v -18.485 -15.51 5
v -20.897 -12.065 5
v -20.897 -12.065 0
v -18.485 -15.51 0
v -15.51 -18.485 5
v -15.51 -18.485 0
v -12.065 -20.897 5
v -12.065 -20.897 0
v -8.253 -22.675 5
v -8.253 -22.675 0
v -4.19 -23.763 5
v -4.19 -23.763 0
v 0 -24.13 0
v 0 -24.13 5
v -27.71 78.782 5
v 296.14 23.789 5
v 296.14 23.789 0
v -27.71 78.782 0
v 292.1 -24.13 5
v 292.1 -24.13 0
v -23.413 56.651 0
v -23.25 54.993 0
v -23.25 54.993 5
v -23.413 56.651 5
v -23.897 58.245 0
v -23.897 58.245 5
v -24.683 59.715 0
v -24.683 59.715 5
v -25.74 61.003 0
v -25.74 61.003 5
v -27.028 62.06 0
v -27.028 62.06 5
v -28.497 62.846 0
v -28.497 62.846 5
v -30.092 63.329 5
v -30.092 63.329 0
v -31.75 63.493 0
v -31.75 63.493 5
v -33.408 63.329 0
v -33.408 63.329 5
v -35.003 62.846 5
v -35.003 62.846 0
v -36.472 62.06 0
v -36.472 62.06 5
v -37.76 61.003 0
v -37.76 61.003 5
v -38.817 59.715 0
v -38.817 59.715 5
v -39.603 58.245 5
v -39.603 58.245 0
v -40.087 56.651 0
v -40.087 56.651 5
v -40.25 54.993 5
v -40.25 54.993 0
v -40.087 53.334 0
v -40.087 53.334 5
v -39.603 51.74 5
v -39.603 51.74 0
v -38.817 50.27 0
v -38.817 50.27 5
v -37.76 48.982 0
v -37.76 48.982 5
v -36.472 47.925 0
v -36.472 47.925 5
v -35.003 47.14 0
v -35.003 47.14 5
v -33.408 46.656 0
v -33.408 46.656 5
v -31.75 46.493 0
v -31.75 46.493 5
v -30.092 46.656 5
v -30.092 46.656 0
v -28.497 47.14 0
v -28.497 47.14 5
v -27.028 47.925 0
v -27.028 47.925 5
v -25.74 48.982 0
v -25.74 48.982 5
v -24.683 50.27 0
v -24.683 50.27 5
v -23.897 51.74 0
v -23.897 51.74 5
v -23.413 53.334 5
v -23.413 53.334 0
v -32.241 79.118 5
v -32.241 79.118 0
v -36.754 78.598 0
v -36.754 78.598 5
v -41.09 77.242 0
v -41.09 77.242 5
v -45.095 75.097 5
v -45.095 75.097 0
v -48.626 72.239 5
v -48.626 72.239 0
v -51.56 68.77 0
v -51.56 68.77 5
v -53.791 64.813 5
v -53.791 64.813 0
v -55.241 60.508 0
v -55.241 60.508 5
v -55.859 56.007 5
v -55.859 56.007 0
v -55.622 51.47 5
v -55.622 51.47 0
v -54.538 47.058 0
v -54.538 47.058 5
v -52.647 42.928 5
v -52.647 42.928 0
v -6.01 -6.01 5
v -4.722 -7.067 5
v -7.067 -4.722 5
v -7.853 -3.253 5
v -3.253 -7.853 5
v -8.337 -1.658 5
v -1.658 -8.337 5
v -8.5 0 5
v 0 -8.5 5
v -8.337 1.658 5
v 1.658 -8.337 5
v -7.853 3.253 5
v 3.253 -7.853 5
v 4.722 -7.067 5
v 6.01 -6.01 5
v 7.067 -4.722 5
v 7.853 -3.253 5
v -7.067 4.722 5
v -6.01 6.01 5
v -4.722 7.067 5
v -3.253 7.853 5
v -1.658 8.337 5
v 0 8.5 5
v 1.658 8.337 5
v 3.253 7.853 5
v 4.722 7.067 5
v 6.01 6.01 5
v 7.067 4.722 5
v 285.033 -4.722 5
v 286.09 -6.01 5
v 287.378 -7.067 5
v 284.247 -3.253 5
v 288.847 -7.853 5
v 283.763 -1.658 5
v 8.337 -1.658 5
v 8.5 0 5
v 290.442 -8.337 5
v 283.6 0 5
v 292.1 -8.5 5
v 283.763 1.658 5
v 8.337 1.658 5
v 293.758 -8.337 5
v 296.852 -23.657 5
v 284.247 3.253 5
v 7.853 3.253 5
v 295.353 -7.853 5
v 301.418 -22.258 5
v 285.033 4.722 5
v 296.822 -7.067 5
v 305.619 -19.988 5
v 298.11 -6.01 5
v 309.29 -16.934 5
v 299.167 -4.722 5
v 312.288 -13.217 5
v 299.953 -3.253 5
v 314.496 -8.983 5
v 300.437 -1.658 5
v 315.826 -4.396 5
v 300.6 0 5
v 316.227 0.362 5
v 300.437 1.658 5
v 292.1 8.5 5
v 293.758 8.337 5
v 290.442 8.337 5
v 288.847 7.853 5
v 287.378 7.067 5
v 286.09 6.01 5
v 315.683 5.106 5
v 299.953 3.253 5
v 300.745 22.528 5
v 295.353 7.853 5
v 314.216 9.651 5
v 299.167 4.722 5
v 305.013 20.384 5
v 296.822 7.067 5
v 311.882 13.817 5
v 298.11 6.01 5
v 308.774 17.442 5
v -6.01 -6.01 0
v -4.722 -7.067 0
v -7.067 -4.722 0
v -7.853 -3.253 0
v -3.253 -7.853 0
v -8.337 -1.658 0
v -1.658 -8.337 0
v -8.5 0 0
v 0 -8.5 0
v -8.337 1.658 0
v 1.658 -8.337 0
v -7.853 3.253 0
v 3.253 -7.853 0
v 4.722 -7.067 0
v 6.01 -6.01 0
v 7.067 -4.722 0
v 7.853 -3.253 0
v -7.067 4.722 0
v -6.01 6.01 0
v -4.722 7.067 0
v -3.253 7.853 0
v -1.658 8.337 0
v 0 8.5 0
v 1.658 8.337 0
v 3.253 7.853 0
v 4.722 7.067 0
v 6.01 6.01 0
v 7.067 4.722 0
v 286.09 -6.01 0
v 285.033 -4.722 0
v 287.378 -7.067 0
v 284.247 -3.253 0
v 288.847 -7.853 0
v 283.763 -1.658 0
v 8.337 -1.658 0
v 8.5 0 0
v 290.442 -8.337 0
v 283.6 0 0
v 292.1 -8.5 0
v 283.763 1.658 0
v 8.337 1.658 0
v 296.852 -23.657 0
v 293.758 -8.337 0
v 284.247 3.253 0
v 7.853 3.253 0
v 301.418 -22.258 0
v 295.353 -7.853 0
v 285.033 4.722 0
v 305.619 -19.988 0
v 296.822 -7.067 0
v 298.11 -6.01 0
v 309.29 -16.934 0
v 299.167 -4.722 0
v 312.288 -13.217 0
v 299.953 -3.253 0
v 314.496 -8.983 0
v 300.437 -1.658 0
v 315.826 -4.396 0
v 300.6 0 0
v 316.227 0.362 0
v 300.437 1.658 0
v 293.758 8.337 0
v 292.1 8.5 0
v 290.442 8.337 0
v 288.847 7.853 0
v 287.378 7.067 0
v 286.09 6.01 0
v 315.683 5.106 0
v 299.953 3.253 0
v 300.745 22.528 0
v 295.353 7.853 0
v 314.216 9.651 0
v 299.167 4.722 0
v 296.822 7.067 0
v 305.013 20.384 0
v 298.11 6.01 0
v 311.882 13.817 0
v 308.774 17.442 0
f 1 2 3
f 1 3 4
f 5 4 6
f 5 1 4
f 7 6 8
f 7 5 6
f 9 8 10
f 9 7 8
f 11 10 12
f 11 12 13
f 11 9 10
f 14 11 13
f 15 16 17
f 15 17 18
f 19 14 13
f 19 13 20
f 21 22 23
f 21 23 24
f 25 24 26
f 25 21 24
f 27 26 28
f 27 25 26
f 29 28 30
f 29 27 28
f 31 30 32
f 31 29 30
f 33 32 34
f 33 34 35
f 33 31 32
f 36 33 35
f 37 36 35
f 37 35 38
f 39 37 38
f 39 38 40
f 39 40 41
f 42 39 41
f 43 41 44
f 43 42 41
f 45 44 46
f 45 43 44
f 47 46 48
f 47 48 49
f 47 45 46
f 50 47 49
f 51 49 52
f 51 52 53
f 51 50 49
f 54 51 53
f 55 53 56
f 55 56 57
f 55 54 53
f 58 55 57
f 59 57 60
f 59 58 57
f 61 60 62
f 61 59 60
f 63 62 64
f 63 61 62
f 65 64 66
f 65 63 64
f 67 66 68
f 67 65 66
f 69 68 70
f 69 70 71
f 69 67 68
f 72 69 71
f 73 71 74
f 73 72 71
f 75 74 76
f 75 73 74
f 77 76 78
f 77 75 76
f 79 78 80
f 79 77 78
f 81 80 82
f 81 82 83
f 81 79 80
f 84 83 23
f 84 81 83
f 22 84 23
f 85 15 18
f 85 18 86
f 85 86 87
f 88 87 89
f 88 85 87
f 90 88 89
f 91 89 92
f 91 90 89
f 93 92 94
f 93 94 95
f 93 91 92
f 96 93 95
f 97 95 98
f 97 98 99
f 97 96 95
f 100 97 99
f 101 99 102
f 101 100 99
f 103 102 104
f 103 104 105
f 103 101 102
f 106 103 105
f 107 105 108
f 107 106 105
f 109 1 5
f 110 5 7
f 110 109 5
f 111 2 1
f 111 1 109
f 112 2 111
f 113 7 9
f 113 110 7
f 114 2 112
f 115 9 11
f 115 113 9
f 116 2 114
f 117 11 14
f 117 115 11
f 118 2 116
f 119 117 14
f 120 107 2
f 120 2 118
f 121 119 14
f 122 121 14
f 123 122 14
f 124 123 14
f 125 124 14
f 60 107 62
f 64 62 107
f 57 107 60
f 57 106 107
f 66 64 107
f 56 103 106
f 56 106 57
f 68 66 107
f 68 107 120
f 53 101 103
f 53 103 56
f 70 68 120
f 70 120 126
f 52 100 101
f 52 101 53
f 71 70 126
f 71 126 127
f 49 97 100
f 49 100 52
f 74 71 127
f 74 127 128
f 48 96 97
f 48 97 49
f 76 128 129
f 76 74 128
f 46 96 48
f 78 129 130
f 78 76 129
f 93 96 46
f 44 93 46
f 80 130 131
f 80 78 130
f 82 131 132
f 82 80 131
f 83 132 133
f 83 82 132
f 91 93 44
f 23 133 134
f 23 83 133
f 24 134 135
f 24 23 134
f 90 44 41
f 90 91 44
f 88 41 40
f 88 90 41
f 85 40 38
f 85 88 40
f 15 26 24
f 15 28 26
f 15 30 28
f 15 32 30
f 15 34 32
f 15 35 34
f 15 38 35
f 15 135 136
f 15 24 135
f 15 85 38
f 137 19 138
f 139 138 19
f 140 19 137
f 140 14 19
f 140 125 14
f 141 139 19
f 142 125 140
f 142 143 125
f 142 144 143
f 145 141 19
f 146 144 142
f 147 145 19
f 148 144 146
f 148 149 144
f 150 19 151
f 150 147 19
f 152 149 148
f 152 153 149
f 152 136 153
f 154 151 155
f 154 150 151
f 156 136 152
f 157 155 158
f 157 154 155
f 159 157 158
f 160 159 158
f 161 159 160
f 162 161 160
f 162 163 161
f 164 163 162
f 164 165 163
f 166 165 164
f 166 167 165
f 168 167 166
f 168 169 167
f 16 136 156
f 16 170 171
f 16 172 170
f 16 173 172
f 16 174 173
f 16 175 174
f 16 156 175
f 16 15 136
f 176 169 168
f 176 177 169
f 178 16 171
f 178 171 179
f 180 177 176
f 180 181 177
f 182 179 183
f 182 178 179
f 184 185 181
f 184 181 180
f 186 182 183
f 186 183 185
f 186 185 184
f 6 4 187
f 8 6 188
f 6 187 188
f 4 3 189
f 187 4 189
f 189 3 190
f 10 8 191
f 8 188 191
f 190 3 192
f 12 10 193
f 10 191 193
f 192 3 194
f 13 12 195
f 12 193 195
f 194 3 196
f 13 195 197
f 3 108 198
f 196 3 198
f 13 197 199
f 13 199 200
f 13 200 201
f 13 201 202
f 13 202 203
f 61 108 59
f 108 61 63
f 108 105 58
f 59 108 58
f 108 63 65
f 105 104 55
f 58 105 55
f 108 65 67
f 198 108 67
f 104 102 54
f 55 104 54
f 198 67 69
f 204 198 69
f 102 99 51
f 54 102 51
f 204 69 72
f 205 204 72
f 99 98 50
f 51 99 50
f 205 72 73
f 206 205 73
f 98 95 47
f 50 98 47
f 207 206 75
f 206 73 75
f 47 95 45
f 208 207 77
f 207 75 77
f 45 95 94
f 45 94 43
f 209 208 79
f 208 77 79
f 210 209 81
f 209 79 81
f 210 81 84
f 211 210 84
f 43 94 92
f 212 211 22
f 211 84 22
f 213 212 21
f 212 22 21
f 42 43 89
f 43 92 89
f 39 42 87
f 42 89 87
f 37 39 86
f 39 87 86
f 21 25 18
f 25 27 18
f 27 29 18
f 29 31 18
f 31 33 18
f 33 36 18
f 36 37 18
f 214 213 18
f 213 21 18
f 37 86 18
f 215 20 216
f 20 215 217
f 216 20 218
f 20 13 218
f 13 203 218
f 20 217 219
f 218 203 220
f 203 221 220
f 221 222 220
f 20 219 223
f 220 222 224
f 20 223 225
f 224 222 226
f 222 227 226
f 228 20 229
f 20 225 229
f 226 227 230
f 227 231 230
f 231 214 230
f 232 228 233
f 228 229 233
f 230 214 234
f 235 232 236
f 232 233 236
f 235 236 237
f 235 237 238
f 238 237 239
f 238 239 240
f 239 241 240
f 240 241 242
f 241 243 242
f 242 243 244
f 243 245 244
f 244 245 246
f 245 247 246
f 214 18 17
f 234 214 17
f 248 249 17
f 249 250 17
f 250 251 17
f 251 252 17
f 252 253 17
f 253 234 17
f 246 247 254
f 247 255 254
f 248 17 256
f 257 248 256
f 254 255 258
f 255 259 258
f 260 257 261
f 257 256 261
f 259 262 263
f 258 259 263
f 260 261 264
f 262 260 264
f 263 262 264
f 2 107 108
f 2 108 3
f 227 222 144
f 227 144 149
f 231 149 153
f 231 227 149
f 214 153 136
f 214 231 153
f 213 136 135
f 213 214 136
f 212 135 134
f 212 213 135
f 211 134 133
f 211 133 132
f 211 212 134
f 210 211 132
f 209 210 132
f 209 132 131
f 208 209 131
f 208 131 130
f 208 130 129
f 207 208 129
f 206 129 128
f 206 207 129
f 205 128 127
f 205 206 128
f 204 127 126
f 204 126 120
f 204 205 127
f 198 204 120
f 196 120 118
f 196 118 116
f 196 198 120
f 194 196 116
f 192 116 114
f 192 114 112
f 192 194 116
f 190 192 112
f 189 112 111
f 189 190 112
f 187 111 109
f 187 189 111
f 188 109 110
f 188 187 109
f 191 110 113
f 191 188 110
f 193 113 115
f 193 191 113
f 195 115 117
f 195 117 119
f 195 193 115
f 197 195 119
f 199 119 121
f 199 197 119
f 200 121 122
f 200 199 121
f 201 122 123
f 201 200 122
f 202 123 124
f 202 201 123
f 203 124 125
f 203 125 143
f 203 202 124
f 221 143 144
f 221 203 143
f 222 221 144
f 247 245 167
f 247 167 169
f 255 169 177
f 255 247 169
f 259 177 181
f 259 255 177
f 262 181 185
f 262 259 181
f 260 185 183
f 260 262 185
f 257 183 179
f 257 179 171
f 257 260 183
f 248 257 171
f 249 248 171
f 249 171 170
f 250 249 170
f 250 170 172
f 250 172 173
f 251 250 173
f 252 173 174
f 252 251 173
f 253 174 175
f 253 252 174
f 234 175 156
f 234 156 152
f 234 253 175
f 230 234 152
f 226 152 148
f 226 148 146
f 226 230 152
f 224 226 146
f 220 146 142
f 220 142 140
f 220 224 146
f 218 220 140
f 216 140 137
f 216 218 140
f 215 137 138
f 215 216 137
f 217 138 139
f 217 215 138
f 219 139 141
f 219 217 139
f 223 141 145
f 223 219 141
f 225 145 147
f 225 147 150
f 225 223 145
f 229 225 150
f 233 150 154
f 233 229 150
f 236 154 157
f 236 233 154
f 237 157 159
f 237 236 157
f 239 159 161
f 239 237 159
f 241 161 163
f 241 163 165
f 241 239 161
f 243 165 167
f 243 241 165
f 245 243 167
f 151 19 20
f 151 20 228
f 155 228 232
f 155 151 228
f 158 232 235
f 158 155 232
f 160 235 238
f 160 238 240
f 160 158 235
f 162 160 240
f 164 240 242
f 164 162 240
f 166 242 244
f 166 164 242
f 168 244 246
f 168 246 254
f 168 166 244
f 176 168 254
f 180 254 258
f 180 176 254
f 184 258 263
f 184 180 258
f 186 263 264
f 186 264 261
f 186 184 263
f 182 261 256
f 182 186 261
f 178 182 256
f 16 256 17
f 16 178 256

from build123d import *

# Parameters (mm, degrees)
SKETCH1_R           = 8.5
BOSS_EXTRUDE1_DEPTH = 5
CUT_EXTRUDE1_DEPTH  = 6


with BuildPart() as part:
    # Sketch1 → Boss-Extrude1 (new body)
    with BuildSketch(Plane.XY):
        with BuildLine():
            Line((0, -31.75), (292.1, -31.75))
            ThreePointArc((292.1, -31.75), (323.737779408, -2.667098451), (297.415343146, 31.30191092))
            Line((297.415343146, 31.30191092), (-26.434656854, 86.29452406))
            ThreePointArc((-26.434656854, 86.29452406), (-57.815571461, 73.121277857), (-59.24630657, 39.11761314))
            Line((-59.24630657, 39.11761314), (-27.49630657, -15.875))
            ThreePointArc((-27.49630657, -15.875), (-15.875, -27.49630657), (0, -31.75))
        make_face()
        with Locations((-31.75, 54.99261314)):
            Circle(SKETCH1_R, mode=Mode.SUBTRACT)
        Circle(SKETCH1_R, mode=Mode.SUBTRACT)
        with Locations((292.1, 0)):
            Circle(SKETCH1_R, mode=Mode.SUBTRACT)
    extrude(amount=BOSS_EXTRUDE1_DEPTH)

    # Sketch2 → Cut-Extrude1 (cut, through all)
    with BuildSketch(Plane.XY.offset(5)):
        with BuildLine():
            Line((297.415343146, 31.30191092), (-26.434656854, 86.29452406))
            ThreePointArc((-26.434656854, 86.29452406), (-57.815571461, 73.121277857), (-59.24630657, 39.11761314))
            Line((-59.24630657, 39.11761314), (-27.49630657, -15.875))
            ThreePointArc((-27.49630657, -15.875), (-15.875, -27.49630657), (0, -31.75))
            Line((0, -31.75), (292.1, -31.75))
            ThreePointArc((292.1, -31.75), (323.737779408, -2.667098451), (297.415343146, 31.30191092))
        make_face()
        with BuildLine():
            Line((296.139660791, 23.789452299), (-27.710339209, 78.782065439))
            ThreePointArc((-27.710339209, 78.782065439), (-51.55983431, 68.770398325), (-52.647192993, 42.92761314))
            Line((-52.647192993, 42.92761314), (-20.897192993, -12.065))
            ThreePointArc((-20.897192993, -12.065), (-12.065, -20.897192993), (0, -24.13))
            Line((0, -24.13), (292.1, -24.13))
            ThreePointArc((292.1, -24.13), (316.14471235, -2.026994822), (296.139660791, 23.789452299))
        make_face(mode=Mode.SUBTRACT)
    extrude(amount=-CUT_EXTRUDE1_DEPTH, mode=Mode.SUBTRACT)


solid = part.part
